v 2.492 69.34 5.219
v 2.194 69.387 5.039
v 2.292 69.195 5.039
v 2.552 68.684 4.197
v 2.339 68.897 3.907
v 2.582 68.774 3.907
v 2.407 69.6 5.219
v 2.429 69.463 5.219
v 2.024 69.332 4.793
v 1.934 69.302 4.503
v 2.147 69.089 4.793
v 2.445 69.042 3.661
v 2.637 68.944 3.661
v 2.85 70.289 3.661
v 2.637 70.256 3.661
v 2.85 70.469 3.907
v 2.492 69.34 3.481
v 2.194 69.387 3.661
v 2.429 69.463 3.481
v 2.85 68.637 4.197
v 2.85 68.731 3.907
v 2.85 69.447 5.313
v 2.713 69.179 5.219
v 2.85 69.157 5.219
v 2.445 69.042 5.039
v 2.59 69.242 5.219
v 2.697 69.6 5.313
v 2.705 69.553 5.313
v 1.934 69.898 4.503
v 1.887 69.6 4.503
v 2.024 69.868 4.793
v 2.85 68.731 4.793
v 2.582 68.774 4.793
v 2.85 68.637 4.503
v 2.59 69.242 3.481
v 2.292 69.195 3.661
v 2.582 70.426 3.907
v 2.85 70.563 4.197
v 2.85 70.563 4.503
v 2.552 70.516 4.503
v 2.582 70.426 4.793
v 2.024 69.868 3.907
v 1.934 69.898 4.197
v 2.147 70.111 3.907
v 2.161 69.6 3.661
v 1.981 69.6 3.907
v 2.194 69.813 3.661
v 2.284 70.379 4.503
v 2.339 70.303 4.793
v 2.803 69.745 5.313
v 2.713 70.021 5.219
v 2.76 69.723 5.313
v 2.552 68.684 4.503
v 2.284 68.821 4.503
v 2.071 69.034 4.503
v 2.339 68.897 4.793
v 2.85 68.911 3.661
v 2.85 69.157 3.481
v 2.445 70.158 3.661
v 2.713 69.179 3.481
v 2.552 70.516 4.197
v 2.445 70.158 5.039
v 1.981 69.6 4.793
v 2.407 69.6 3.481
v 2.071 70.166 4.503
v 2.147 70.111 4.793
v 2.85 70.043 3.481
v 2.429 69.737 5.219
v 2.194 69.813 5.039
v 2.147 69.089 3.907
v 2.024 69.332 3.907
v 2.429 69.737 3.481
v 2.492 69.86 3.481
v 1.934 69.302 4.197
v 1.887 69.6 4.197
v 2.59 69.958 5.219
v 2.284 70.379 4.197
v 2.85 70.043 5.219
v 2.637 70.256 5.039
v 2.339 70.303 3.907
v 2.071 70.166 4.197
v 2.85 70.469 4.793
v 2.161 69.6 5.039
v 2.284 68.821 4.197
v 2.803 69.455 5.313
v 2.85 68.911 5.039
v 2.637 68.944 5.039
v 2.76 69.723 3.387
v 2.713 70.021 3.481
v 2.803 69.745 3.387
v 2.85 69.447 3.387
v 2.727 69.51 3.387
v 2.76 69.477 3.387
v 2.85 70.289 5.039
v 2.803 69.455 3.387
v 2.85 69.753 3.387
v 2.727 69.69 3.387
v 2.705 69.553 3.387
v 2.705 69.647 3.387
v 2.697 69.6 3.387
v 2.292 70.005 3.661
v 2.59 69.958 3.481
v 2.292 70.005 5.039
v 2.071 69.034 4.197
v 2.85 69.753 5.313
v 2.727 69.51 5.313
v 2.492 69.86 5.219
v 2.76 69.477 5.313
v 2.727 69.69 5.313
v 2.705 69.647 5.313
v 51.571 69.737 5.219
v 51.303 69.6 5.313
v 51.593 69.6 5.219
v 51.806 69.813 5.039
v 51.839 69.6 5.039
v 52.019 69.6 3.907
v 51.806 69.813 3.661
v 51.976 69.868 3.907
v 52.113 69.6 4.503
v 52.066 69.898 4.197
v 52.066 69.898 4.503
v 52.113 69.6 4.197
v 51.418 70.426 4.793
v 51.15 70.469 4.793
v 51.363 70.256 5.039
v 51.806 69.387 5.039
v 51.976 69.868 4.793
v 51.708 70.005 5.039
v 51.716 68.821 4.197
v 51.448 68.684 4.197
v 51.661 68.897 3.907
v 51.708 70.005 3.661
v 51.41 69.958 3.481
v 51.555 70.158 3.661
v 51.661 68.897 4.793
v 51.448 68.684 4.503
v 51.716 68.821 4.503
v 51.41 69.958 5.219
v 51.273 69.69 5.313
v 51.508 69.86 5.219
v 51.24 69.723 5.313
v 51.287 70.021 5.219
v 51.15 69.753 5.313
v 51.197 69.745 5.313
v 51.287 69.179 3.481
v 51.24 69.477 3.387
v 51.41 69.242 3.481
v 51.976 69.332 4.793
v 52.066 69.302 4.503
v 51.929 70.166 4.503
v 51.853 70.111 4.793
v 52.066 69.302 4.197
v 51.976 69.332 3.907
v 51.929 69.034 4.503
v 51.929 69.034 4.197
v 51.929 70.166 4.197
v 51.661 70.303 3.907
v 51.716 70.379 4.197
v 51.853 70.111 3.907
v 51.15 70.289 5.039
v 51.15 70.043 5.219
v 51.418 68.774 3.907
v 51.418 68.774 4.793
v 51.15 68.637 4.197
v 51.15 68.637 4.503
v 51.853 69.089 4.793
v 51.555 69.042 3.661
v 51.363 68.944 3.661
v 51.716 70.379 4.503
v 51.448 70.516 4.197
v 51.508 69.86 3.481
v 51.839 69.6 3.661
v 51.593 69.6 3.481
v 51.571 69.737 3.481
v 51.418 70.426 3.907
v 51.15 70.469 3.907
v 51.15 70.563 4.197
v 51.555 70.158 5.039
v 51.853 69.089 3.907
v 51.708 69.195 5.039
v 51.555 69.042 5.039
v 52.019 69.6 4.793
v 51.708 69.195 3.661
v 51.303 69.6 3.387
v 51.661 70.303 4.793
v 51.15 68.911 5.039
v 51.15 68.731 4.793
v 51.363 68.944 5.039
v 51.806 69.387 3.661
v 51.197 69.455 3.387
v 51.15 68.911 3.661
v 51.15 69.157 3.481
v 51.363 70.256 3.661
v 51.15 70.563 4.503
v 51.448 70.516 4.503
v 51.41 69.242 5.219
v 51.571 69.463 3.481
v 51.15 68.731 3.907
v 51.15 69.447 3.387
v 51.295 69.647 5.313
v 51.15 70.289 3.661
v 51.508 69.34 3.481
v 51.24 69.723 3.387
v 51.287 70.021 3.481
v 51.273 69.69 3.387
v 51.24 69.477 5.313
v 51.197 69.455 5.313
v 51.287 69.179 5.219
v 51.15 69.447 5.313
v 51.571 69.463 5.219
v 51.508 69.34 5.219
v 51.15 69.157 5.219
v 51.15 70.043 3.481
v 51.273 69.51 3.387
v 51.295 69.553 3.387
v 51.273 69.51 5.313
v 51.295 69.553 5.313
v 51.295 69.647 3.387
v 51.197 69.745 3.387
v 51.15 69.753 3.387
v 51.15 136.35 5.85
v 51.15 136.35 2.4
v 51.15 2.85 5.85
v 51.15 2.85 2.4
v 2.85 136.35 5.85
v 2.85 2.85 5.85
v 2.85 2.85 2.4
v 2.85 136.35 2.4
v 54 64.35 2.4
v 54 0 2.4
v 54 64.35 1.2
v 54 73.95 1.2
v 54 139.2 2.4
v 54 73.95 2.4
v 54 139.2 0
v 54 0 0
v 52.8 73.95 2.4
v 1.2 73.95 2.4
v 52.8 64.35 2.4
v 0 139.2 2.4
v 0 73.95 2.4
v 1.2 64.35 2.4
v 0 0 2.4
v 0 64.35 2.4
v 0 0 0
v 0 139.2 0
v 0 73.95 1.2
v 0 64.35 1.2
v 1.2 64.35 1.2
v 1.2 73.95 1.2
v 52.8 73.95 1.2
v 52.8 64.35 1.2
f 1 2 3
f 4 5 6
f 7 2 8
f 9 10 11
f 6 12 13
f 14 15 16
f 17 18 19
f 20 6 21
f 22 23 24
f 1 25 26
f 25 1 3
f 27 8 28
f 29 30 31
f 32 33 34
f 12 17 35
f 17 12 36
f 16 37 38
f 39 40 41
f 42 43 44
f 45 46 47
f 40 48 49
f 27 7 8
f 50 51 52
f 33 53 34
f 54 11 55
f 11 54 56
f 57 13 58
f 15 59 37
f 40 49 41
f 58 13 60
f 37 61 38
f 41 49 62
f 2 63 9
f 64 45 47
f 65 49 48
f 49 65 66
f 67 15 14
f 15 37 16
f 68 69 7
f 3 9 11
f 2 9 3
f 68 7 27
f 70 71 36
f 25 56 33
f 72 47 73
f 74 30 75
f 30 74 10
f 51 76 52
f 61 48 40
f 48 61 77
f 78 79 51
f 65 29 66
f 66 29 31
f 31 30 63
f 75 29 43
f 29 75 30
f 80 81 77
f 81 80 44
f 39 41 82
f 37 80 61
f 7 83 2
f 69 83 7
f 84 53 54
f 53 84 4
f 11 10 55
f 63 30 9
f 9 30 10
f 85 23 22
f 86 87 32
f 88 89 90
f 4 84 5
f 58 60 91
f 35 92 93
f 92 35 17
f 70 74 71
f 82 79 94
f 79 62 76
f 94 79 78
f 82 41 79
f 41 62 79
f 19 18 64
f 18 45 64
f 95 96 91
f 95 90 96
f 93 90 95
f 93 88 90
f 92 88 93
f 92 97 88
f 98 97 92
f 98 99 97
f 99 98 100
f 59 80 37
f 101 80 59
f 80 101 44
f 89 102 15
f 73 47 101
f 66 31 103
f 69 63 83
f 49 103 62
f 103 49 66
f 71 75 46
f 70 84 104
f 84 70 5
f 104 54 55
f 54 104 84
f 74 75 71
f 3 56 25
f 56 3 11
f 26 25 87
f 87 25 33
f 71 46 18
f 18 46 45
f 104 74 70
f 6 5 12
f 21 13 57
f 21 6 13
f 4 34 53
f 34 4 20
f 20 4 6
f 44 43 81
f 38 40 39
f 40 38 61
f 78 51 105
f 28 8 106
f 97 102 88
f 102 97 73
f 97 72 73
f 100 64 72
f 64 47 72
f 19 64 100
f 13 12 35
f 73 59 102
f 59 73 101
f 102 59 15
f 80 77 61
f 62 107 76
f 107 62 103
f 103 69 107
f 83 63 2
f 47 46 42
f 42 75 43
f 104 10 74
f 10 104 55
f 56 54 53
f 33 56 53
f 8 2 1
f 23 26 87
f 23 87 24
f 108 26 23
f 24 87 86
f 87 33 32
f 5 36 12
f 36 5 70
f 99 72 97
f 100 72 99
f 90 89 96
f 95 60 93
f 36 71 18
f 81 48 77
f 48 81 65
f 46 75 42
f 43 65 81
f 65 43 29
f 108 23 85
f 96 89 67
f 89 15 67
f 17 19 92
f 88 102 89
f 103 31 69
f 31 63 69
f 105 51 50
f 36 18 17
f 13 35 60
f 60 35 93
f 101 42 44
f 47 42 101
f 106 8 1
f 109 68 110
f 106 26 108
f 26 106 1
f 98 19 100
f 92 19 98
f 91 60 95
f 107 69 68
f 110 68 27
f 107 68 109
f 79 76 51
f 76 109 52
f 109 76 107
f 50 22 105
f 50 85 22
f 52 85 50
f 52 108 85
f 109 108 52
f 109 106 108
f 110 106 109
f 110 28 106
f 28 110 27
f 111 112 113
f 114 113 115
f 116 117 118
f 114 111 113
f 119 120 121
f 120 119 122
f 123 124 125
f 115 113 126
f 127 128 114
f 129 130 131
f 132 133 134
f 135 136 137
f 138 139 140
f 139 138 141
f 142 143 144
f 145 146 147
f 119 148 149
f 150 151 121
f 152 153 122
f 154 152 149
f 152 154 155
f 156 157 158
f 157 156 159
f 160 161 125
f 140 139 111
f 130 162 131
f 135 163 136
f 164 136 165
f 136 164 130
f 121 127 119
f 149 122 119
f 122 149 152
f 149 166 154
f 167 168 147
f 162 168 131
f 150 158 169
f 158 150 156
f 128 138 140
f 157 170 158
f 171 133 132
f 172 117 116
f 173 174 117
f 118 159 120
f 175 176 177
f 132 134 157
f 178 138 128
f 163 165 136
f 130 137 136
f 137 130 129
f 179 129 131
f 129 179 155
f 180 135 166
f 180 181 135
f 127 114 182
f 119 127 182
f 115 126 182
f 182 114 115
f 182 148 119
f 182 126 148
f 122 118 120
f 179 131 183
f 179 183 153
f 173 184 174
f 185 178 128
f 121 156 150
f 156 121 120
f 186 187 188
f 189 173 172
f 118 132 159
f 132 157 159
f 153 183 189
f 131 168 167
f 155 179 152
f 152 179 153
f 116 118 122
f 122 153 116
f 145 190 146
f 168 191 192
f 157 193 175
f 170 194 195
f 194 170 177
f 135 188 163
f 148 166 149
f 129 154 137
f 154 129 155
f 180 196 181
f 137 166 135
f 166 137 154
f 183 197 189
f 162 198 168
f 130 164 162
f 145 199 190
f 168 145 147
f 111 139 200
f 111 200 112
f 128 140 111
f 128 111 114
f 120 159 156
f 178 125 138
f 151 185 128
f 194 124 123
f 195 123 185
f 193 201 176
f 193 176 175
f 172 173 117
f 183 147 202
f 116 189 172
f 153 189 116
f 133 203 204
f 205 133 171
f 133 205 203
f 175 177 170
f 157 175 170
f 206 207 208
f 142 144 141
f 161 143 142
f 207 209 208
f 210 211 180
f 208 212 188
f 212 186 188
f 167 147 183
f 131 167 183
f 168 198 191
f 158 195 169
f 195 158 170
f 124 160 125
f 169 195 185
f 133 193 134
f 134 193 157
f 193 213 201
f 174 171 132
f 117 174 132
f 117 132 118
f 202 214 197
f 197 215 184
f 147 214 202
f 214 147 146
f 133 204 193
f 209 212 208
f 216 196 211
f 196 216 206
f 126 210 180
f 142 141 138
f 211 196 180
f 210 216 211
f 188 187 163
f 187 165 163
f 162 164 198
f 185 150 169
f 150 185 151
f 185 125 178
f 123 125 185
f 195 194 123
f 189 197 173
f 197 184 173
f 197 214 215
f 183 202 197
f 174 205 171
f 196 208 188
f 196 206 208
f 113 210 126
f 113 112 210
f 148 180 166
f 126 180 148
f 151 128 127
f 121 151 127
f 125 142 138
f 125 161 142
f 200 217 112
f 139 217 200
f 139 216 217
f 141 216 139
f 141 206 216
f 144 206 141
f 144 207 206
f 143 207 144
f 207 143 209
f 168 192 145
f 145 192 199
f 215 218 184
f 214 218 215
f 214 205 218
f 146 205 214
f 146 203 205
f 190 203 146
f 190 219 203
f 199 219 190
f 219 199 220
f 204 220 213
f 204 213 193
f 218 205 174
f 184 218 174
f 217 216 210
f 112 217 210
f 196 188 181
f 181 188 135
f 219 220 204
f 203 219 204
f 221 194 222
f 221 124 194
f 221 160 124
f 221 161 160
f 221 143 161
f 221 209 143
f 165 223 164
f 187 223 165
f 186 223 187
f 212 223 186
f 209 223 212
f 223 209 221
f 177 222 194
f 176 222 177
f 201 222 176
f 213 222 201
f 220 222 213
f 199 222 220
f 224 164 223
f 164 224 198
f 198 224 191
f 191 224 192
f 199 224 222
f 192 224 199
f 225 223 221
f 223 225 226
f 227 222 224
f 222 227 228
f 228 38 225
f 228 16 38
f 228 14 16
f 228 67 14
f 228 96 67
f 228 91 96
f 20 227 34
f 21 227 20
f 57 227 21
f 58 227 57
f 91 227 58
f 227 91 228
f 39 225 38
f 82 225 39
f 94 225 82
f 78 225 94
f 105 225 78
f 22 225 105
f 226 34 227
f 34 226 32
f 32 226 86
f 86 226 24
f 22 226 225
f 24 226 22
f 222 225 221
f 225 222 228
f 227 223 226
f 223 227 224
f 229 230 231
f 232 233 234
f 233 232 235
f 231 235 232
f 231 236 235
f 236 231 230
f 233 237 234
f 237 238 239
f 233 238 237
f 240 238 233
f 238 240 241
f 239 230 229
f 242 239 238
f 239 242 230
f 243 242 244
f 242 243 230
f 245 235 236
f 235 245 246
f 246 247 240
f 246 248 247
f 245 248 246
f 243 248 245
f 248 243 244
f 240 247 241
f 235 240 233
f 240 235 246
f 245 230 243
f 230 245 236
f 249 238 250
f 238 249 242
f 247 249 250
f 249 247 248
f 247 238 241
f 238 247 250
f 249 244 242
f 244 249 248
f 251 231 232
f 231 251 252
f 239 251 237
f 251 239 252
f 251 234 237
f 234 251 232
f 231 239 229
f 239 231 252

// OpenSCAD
// file: ../Modules/Box/hollow.scad
/**
 * Dibuja un hueco en una caja con las dimensiones especificadas.
 * Si las dimensiones necesitadas son las externas, se debe restar el borde.
 *
 * @param {Number} width     Ancho del hueco (eje X).
 * @param {Number} length    Largo del hueco (eje Y).
 * @param {Number} height    Alto del hueco (eje Z).
 * @param {Number} thickness Grosor del borde.
 *
 * @author  Joaquín Fernández
 * @url     https://gitlab.com/joaquinfq/openscad/blob/master/Modules/Box/hollow.scad
 * @license CC-BY-NC-4.0
 */
module boxHollow(width, length, height, thickness = 1)
{
    if (thickness > 0)
    {
        _b = 2 * thickness;
        difference()
        {
            cube([ width  + _b, length + _b, height + thickness ]);
            translate([ thickness, thickness, thickness ])
            {
                cube([ width, length, height ]);
            }
        }
    }
}
// file: ../Functions/ceilMultiple.scad
/**
 * Aproxima el valor especificado al múltiplo superior
 * más cercano del valor de referencia.
 * Su principal uso es aproximar por exceso un valor a
 * un `layerHeight` superior para dejar margen.
 *
 * @param value Valor a aproximar.
 * @param ref   Valor a usar como referencia.
 *
 * @author  Joaquín Fernández
 * @license CC-BY-NC-4.0
 * @url     https://gitlab.com/joaquinfq/openscad/blob/master/Functions/ceilMultiple.scad
 */
function ceilMultiple(value, ref) = ceil(value / ref) * ref;
// file: ../Functions/flatten.scad
/**
 * Devuelve un array con cada uno de los elementos de
 * un subarray según el índice especificado.
 *
 * Ejemplo:
 *
 * in = [ [ 0, 1 ], [ 2, 3 ] ];
 * echo(flatten(in, 0)); // [ 0, 2 ]
 * echo(flatten(in, 1)); // [ 1, 3 ]
 *
 * @param {Array}  array Array multidimensional a usar para obtener los valores.
 * @param {Number} column Columna de los subarray para extraer sus valores.
 * @param {Number} row    Fila del array siendo procesada.
 * @param {Array}  output Acumulador donde se van metiendo los valores.
 *                        Si se pasa algún valor, se concatenan al resultado.
 *
 * @author  Joaquín Fernández
 * @license CC-BY-NC-4.0
 * @url     https://gitlab.com/joaquinfq/openscad/blob/master/Functions/flatten.scad
 */
function flatten(array, column = 0, row = 0, output = []) = row > 0
    ? flatten(array, column, row - 1, concat(output, [ array[row][column] ]))
    : concat(output, [ array[row][column] ]);
// main file
/**
 * Dibuja una caja para guardar brocas.
 * Modificando los valores de la variable `sizes` se puede incluso
 * usar para guardar otros tipos de elementos tales como lápices,
 * bolígrafos, pinceles, etc..
 *
 * @author  Joaquín Fernández
 * @url     https://gitlab.com/joaquinfq/openscad/blob/master/Storage/DrillHolder.scad
 * @license CC-BY-NC-4.0
 * @see     http://www.thingiverse.com/thing:2095807
 */
use <../Functions/flatten.scad>
use <../Functions/ceilMultiple.scad>
use <../Modules/Box/hollow.scad>
//-----------------------------------------------------------------------
// Valores personalizables
//-----------------------------------------------------------------------
// Valor del "layer height"
// El grosor de las paredes se calcula en función a este valor.
lh = 0.3;
// Indica si se agrega la muesca para sacar las brocas más fácilmente.
cut = true;
// Indica si se muestra la tapa o la caja.
showBox = 0;
// Dimensiones de las brocas: [0]: Diámetro, [1]: Largo
// Si se quiere holgura, tomar en cuenta a la hora de asignar los valores.
// Se pueden poner en cualquier orden pero si se ponen de mayor a menor
// se aprovecha el espacio que queda para guardar tornillos, puntas, etc.
sizes = [
    [ 10, 133 ],
    [  8, 117 ],
    [  6,  93 ],
    [  5,  86 ],
    [  4,  74 ],
    [  3,  61 ]
];
//-----------------------------------------------------------------------
// Fin de la personalización.
//-----------------------------------------------------------------------
function offsetX(i, total = 0, thickness = 0) = i > 0
    ? offsetX(i - 1, total + sizes[i - 1][0] + thickness + d, thickness)
    : total + thickness;

function flatSizes(idx = 0, i = len(sizes) - 1, arr = []) = flatten(sizes, idx, i, arr);

// Grosor de las paredes.
b  = ceilMultiple(1.2, lh);
// Altura de la parte de la tapa que entra en la caja
ci = ceilMultiple(3.75, lh);
// Valor a usar como holgura.
// Esto permite poner las medidas absolutas sin estar pendiente 
// de sumarle un pequeño espacio para que la broca entre fácil.
d  = 4 * lh;
// Cantidad de elementos
n  = len(sizes);
// Altura interna de la caja (eje Z)
h  = ceilMultiple(max(flatSizes(0)) + d + ci, lh);
// Largo interno de la caja (eje Y)
l  = ceilMultiple(max(flatSizes(1)) + d, lh);
// Anchura interna de la caja (eje X)
w  = offsetX(n, 0, b) - 2 * b;
//-----------------------------------------------------------------------
// Inicio
//-----------------------------------------------------------------------
module box(w, l, h, b)
{
    _2b = 2 * b;
    difference()
    {
        difference()
        {
            union()
            {
                boxHollow(w, l, h, _2b);
                for (i = [ 0 : n - 1 ])
                {
                    translate([ offsetX(i, 0, b), b, 0 ])
                    {
                        boxHollow(
                            ceilMultiple(sizes[i][0] + d,lh),
                            ceilMultiple(sizes[i][1] + d, lh),
                            h,
                            b
                        );
                    }
                }
            }
            if (cut)
            {
                // Hacemos una muesca para sacar las brocas fácilmente.
                // La altura de las pestaña que queda es la mitad 
                // de la broca más fina.
                dy = min(flatSizes(1));
                translate([ _2b, dy / 4, _2b + min(flatSizes(0)) / 2 ])
                {
                    cube([ w - b, dy / 2, h ]);
                }
            }
        }
        // Colocamos la tapa para sacar la muesca de cierre.
        _h = h + 2 * _2b;
        _l = l + 2 * _2b;
        _w = w + 2 * _2b;
        translate([ _w, 0, _h ])
        {
            rotate([ 0, 180, 0 ])
            {
                cover(_w, _l, _2b, _2b);
            }
        }
    }
}
module cover(w, l, h, b, t = 0, hi = ci)
{
    _b = b + t;
    _d = b - t;
    _l = l - _b * 2;
    _w = w - _b * 2;
    difference()
    {
        union()
        {
            // Bloque externo
            cube([ w, l, h ]);
            translate([ _b, _b, h ])
            {
                // Bloque interno
                cube([ _w, _l, hi - t ]);
                translate([ 0, 0, (hi - t) / 2 ])
                {
                    for (i = [ 0, 1 ])
                    {
                        // Pestañas lado corto
                        //translate([ _w / 2, i * _l, t / 2 ])
                        //{
                        //    sphere(d = _d, center = true, $fn = 20);
                        //}
                        // Pestañas lado largo
                        translate([ i * _w, _l / 2, t / 2 ])
                        {
                            sphere(d = _d, center = true, $fn = 20);
                        }
                    }
                }
            }
        }
        for (i = [ 0, 1 ])
        {
            // Muescas lado corto
            //translate([ _w / 2 - b, i * (l - b / 2), b / 2 ])
            //{
            //    cube([ 4 * b, b / 2, 10 ]);
            //}
            // Muescas lado largo
            translate([ i * (w - b / 2), _l / 2 - b, b / 2 ])
            {
                cube([ b / 2, 4 * b, b ]);
            }
        }
    }
}
if (showBox)
{
    box(w, l, h, b);
}
else
{
    cover(
        w + 4 * b,
        l + 4 * b,
        2 * b,
        2 * b,
        1.5 * lh
    );
}
// 51.0 x 139.8 x 17.1
// 50.4 x 140.4 x 17.1
